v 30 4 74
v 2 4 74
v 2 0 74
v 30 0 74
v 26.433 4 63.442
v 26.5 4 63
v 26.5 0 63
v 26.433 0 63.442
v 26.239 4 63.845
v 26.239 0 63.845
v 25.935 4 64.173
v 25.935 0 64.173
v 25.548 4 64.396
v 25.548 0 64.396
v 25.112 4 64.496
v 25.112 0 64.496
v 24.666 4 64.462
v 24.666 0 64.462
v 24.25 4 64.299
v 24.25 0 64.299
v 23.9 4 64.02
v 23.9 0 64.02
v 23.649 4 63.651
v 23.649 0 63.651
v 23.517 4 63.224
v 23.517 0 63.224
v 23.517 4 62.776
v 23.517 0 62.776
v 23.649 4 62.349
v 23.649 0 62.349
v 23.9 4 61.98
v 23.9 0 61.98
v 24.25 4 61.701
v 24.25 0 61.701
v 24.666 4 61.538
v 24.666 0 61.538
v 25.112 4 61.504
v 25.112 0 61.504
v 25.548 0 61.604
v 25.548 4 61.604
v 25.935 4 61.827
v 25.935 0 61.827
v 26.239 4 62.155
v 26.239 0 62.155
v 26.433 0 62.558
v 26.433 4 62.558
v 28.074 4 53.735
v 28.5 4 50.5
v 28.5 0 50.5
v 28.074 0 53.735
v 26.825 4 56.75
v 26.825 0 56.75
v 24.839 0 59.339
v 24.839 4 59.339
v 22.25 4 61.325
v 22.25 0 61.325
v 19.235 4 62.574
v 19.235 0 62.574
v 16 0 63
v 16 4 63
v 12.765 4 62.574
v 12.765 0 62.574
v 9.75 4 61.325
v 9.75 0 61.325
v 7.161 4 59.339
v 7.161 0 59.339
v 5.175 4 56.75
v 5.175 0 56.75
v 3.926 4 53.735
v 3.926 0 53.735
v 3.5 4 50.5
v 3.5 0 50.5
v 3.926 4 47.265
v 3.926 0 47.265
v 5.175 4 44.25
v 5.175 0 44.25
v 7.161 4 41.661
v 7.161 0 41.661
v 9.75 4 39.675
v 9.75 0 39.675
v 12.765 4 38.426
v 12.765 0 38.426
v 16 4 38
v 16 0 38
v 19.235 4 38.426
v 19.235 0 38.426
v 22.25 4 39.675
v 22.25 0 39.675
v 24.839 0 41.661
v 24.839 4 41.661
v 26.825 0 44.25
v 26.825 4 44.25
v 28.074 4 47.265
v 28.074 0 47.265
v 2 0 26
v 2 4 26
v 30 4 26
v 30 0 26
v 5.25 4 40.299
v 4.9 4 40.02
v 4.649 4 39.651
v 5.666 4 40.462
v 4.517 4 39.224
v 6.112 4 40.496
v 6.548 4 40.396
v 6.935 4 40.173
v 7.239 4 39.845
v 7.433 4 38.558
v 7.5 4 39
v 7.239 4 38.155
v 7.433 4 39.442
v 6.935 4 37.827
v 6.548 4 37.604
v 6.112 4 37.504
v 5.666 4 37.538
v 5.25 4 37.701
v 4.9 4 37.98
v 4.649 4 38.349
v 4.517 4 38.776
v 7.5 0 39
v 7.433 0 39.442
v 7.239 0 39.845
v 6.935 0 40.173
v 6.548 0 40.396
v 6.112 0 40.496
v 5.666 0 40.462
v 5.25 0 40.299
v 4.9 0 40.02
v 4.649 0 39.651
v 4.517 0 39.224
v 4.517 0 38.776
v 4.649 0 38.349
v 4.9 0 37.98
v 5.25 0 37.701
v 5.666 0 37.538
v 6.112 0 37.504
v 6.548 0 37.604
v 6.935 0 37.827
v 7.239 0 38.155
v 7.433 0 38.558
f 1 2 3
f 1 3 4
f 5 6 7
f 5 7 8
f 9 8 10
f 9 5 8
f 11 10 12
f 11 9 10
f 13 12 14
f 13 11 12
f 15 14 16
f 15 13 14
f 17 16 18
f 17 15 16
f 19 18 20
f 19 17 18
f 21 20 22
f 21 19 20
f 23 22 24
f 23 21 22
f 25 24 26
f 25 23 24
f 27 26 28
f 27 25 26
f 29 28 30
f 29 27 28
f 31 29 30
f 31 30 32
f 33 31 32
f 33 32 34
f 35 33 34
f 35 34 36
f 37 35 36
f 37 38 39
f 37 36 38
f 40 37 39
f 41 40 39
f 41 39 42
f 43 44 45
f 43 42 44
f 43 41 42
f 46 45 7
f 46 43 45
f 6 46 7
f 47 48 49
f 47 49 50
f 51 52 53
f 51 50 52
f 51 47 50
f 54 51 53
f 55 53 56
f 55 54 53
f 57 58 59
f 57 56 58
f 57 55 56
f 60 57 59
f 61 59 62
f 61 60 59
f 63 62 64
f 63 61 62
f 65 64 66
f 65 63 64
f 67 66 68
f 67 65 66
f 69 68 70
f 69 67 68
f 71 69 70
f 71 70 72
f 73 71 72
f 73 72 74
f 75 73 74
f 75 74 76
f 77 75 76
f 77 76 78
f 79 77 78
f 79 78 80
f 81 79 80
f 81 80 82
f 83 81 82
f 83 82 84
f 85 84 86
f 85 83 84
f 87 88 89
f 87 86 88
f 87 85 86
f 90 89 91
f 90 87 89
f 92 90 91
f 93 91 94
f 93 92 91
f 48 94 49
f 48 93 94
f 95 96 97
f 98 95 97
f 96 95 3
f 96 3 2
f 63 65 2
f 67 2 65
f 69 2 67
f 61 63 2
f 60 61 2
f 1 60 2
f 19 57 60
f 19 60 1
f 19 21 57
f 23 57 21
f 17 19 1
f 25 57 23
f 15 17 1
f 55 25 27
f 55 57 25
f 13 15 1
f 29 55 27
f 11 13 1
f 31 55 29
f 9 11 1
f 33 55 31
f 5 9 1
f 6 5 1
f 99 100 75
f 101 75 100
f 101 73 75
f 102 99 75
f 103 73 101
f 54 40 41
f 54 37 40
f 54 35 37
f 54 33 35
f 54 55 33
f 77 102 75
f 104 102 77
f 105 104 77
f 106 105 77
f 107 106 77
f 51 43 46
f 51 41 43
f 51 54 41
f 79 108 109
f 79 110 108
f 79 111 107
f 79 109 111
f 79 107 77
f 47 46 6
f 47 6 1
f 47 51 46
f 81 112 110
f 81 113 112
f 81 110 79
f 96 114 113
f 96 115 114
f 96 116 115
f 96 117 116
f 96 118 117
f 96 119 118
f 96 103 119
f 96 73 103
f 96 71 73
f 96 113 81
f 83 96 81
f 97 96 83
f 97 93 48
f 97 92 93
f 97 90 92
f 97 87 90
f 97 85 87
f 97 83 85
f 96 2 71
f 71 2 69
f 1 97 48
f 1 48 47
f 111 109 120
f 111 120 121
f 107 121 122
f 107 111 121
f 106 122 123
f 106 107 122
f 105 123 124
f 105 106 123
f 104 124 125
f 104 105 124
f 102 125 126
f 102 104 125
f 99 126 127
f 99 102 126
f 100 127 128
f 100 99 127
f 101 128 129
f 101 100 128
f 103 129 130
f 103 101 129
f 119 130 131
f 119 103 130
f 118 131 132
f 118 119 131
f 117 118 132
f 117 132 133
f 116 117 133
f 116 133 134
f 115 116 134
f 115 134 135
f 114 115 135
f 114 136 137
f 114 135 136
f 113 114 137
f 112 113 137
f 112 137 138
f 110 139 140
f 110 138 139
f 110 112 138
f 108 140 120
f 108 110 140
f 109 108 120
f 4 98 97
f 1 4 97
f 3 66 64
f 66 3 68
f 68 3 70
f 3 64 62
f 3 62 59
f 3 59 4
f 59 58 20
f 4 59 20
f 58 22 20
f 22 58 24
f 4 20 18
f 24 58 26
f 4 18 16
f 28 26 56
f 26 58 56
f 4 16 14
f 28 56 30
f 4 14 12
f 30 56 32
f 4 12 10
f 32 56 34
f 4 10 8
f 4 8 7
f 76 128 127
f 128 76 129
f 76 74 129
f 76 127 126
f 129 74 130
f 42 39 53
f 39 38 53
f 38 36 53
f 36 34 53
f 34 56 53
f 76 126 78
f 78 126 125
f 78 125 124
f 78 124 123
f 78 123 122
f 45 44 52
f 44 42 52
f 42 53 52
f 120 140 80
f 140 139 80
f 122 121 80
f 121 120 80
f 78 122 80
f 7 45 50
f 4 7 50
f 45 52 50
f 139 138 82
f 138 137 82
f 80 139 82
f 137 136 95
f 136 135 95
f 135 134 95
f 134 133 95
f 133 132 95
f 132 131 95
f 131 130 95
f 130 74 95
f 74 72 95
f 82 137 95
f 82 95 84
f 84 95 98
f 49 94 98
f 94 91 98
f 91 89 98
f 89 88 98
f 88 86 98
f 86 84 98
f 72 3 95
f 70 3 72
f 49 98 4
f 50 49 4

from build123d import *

# Parameters (mm, degrees)
CYLINDER879_R     = 12.5
CYLINDER879_DEPTH = 10
CYLINDER877_R     = 1.5
CYLINDER877_DEPTH = 10
CYLINDER878_R     = 1.5
CYLINDER878_DEPTH = 10
BOX424_W          = 28
BOX424_H          = 4
BOX424_DEPTH      = 48


with BuildPart() as v_lec879:
    # Cylinder879 → Cylinder879 (new body)
    with BuildSketch(Plane(origin=(16, 7, 50.5), x_dir=(1, 0, 0), z_dir=(0, -1, 0))):
        Circle(CYLINDER879_R)
    extrude(amount=CYLINDER879_DEPTH)


with BuildPart() as v_lec877:
    # Cylinder877 → Cylinder877 (new body)
    with BuildSketch(Plane(origin=(29, 6, 63), x_dir=(1, 0, 0), z_dir=(0, -1, 0))):
        Circle(CYLINDER877_R)
    extrude(amount=CYLINDER877_DEPTH)


with BuildPart() as compound504:
    # Cylinder878 → Cylinder878 (new body)
    with BuildSketch(Plane(origin=(10, 6, 39), x_dir=(1, 0, 0), z_dir=(0, -1, 0))):
        Circle(CYLINDER878_R)
    extrude(amount=CYLINDER878_DEPTH)

    # Compound504: union Válec877
    add(v_lec877.part)


with BuildPart() as compound504_1:
    # Compound504 placement: moved
    add(compound504.part.moved(Location((-4, 0, 0))))


with BuildPart() as cut022:
    # Box424 → Box424 (new body)
    with BuildSketch(Plane(origin=(2, 0, 26), x_dir=(1, 0, 0), z_dir=(0, 0, 1))):
        with Locations((14, 2)):
            Rectangle(BOX424_W, BOX424_H)
    extrude(amount=BOX424_DEPTH)

    # Cut021: cut Compound504
    add(compound504_1.part, mode=Mode.SUBTRACT)

    # Cut022: cut Válec879
    add(v_lec879.part, mode=Mode.SUBTRACT)


solid = cut022.part
